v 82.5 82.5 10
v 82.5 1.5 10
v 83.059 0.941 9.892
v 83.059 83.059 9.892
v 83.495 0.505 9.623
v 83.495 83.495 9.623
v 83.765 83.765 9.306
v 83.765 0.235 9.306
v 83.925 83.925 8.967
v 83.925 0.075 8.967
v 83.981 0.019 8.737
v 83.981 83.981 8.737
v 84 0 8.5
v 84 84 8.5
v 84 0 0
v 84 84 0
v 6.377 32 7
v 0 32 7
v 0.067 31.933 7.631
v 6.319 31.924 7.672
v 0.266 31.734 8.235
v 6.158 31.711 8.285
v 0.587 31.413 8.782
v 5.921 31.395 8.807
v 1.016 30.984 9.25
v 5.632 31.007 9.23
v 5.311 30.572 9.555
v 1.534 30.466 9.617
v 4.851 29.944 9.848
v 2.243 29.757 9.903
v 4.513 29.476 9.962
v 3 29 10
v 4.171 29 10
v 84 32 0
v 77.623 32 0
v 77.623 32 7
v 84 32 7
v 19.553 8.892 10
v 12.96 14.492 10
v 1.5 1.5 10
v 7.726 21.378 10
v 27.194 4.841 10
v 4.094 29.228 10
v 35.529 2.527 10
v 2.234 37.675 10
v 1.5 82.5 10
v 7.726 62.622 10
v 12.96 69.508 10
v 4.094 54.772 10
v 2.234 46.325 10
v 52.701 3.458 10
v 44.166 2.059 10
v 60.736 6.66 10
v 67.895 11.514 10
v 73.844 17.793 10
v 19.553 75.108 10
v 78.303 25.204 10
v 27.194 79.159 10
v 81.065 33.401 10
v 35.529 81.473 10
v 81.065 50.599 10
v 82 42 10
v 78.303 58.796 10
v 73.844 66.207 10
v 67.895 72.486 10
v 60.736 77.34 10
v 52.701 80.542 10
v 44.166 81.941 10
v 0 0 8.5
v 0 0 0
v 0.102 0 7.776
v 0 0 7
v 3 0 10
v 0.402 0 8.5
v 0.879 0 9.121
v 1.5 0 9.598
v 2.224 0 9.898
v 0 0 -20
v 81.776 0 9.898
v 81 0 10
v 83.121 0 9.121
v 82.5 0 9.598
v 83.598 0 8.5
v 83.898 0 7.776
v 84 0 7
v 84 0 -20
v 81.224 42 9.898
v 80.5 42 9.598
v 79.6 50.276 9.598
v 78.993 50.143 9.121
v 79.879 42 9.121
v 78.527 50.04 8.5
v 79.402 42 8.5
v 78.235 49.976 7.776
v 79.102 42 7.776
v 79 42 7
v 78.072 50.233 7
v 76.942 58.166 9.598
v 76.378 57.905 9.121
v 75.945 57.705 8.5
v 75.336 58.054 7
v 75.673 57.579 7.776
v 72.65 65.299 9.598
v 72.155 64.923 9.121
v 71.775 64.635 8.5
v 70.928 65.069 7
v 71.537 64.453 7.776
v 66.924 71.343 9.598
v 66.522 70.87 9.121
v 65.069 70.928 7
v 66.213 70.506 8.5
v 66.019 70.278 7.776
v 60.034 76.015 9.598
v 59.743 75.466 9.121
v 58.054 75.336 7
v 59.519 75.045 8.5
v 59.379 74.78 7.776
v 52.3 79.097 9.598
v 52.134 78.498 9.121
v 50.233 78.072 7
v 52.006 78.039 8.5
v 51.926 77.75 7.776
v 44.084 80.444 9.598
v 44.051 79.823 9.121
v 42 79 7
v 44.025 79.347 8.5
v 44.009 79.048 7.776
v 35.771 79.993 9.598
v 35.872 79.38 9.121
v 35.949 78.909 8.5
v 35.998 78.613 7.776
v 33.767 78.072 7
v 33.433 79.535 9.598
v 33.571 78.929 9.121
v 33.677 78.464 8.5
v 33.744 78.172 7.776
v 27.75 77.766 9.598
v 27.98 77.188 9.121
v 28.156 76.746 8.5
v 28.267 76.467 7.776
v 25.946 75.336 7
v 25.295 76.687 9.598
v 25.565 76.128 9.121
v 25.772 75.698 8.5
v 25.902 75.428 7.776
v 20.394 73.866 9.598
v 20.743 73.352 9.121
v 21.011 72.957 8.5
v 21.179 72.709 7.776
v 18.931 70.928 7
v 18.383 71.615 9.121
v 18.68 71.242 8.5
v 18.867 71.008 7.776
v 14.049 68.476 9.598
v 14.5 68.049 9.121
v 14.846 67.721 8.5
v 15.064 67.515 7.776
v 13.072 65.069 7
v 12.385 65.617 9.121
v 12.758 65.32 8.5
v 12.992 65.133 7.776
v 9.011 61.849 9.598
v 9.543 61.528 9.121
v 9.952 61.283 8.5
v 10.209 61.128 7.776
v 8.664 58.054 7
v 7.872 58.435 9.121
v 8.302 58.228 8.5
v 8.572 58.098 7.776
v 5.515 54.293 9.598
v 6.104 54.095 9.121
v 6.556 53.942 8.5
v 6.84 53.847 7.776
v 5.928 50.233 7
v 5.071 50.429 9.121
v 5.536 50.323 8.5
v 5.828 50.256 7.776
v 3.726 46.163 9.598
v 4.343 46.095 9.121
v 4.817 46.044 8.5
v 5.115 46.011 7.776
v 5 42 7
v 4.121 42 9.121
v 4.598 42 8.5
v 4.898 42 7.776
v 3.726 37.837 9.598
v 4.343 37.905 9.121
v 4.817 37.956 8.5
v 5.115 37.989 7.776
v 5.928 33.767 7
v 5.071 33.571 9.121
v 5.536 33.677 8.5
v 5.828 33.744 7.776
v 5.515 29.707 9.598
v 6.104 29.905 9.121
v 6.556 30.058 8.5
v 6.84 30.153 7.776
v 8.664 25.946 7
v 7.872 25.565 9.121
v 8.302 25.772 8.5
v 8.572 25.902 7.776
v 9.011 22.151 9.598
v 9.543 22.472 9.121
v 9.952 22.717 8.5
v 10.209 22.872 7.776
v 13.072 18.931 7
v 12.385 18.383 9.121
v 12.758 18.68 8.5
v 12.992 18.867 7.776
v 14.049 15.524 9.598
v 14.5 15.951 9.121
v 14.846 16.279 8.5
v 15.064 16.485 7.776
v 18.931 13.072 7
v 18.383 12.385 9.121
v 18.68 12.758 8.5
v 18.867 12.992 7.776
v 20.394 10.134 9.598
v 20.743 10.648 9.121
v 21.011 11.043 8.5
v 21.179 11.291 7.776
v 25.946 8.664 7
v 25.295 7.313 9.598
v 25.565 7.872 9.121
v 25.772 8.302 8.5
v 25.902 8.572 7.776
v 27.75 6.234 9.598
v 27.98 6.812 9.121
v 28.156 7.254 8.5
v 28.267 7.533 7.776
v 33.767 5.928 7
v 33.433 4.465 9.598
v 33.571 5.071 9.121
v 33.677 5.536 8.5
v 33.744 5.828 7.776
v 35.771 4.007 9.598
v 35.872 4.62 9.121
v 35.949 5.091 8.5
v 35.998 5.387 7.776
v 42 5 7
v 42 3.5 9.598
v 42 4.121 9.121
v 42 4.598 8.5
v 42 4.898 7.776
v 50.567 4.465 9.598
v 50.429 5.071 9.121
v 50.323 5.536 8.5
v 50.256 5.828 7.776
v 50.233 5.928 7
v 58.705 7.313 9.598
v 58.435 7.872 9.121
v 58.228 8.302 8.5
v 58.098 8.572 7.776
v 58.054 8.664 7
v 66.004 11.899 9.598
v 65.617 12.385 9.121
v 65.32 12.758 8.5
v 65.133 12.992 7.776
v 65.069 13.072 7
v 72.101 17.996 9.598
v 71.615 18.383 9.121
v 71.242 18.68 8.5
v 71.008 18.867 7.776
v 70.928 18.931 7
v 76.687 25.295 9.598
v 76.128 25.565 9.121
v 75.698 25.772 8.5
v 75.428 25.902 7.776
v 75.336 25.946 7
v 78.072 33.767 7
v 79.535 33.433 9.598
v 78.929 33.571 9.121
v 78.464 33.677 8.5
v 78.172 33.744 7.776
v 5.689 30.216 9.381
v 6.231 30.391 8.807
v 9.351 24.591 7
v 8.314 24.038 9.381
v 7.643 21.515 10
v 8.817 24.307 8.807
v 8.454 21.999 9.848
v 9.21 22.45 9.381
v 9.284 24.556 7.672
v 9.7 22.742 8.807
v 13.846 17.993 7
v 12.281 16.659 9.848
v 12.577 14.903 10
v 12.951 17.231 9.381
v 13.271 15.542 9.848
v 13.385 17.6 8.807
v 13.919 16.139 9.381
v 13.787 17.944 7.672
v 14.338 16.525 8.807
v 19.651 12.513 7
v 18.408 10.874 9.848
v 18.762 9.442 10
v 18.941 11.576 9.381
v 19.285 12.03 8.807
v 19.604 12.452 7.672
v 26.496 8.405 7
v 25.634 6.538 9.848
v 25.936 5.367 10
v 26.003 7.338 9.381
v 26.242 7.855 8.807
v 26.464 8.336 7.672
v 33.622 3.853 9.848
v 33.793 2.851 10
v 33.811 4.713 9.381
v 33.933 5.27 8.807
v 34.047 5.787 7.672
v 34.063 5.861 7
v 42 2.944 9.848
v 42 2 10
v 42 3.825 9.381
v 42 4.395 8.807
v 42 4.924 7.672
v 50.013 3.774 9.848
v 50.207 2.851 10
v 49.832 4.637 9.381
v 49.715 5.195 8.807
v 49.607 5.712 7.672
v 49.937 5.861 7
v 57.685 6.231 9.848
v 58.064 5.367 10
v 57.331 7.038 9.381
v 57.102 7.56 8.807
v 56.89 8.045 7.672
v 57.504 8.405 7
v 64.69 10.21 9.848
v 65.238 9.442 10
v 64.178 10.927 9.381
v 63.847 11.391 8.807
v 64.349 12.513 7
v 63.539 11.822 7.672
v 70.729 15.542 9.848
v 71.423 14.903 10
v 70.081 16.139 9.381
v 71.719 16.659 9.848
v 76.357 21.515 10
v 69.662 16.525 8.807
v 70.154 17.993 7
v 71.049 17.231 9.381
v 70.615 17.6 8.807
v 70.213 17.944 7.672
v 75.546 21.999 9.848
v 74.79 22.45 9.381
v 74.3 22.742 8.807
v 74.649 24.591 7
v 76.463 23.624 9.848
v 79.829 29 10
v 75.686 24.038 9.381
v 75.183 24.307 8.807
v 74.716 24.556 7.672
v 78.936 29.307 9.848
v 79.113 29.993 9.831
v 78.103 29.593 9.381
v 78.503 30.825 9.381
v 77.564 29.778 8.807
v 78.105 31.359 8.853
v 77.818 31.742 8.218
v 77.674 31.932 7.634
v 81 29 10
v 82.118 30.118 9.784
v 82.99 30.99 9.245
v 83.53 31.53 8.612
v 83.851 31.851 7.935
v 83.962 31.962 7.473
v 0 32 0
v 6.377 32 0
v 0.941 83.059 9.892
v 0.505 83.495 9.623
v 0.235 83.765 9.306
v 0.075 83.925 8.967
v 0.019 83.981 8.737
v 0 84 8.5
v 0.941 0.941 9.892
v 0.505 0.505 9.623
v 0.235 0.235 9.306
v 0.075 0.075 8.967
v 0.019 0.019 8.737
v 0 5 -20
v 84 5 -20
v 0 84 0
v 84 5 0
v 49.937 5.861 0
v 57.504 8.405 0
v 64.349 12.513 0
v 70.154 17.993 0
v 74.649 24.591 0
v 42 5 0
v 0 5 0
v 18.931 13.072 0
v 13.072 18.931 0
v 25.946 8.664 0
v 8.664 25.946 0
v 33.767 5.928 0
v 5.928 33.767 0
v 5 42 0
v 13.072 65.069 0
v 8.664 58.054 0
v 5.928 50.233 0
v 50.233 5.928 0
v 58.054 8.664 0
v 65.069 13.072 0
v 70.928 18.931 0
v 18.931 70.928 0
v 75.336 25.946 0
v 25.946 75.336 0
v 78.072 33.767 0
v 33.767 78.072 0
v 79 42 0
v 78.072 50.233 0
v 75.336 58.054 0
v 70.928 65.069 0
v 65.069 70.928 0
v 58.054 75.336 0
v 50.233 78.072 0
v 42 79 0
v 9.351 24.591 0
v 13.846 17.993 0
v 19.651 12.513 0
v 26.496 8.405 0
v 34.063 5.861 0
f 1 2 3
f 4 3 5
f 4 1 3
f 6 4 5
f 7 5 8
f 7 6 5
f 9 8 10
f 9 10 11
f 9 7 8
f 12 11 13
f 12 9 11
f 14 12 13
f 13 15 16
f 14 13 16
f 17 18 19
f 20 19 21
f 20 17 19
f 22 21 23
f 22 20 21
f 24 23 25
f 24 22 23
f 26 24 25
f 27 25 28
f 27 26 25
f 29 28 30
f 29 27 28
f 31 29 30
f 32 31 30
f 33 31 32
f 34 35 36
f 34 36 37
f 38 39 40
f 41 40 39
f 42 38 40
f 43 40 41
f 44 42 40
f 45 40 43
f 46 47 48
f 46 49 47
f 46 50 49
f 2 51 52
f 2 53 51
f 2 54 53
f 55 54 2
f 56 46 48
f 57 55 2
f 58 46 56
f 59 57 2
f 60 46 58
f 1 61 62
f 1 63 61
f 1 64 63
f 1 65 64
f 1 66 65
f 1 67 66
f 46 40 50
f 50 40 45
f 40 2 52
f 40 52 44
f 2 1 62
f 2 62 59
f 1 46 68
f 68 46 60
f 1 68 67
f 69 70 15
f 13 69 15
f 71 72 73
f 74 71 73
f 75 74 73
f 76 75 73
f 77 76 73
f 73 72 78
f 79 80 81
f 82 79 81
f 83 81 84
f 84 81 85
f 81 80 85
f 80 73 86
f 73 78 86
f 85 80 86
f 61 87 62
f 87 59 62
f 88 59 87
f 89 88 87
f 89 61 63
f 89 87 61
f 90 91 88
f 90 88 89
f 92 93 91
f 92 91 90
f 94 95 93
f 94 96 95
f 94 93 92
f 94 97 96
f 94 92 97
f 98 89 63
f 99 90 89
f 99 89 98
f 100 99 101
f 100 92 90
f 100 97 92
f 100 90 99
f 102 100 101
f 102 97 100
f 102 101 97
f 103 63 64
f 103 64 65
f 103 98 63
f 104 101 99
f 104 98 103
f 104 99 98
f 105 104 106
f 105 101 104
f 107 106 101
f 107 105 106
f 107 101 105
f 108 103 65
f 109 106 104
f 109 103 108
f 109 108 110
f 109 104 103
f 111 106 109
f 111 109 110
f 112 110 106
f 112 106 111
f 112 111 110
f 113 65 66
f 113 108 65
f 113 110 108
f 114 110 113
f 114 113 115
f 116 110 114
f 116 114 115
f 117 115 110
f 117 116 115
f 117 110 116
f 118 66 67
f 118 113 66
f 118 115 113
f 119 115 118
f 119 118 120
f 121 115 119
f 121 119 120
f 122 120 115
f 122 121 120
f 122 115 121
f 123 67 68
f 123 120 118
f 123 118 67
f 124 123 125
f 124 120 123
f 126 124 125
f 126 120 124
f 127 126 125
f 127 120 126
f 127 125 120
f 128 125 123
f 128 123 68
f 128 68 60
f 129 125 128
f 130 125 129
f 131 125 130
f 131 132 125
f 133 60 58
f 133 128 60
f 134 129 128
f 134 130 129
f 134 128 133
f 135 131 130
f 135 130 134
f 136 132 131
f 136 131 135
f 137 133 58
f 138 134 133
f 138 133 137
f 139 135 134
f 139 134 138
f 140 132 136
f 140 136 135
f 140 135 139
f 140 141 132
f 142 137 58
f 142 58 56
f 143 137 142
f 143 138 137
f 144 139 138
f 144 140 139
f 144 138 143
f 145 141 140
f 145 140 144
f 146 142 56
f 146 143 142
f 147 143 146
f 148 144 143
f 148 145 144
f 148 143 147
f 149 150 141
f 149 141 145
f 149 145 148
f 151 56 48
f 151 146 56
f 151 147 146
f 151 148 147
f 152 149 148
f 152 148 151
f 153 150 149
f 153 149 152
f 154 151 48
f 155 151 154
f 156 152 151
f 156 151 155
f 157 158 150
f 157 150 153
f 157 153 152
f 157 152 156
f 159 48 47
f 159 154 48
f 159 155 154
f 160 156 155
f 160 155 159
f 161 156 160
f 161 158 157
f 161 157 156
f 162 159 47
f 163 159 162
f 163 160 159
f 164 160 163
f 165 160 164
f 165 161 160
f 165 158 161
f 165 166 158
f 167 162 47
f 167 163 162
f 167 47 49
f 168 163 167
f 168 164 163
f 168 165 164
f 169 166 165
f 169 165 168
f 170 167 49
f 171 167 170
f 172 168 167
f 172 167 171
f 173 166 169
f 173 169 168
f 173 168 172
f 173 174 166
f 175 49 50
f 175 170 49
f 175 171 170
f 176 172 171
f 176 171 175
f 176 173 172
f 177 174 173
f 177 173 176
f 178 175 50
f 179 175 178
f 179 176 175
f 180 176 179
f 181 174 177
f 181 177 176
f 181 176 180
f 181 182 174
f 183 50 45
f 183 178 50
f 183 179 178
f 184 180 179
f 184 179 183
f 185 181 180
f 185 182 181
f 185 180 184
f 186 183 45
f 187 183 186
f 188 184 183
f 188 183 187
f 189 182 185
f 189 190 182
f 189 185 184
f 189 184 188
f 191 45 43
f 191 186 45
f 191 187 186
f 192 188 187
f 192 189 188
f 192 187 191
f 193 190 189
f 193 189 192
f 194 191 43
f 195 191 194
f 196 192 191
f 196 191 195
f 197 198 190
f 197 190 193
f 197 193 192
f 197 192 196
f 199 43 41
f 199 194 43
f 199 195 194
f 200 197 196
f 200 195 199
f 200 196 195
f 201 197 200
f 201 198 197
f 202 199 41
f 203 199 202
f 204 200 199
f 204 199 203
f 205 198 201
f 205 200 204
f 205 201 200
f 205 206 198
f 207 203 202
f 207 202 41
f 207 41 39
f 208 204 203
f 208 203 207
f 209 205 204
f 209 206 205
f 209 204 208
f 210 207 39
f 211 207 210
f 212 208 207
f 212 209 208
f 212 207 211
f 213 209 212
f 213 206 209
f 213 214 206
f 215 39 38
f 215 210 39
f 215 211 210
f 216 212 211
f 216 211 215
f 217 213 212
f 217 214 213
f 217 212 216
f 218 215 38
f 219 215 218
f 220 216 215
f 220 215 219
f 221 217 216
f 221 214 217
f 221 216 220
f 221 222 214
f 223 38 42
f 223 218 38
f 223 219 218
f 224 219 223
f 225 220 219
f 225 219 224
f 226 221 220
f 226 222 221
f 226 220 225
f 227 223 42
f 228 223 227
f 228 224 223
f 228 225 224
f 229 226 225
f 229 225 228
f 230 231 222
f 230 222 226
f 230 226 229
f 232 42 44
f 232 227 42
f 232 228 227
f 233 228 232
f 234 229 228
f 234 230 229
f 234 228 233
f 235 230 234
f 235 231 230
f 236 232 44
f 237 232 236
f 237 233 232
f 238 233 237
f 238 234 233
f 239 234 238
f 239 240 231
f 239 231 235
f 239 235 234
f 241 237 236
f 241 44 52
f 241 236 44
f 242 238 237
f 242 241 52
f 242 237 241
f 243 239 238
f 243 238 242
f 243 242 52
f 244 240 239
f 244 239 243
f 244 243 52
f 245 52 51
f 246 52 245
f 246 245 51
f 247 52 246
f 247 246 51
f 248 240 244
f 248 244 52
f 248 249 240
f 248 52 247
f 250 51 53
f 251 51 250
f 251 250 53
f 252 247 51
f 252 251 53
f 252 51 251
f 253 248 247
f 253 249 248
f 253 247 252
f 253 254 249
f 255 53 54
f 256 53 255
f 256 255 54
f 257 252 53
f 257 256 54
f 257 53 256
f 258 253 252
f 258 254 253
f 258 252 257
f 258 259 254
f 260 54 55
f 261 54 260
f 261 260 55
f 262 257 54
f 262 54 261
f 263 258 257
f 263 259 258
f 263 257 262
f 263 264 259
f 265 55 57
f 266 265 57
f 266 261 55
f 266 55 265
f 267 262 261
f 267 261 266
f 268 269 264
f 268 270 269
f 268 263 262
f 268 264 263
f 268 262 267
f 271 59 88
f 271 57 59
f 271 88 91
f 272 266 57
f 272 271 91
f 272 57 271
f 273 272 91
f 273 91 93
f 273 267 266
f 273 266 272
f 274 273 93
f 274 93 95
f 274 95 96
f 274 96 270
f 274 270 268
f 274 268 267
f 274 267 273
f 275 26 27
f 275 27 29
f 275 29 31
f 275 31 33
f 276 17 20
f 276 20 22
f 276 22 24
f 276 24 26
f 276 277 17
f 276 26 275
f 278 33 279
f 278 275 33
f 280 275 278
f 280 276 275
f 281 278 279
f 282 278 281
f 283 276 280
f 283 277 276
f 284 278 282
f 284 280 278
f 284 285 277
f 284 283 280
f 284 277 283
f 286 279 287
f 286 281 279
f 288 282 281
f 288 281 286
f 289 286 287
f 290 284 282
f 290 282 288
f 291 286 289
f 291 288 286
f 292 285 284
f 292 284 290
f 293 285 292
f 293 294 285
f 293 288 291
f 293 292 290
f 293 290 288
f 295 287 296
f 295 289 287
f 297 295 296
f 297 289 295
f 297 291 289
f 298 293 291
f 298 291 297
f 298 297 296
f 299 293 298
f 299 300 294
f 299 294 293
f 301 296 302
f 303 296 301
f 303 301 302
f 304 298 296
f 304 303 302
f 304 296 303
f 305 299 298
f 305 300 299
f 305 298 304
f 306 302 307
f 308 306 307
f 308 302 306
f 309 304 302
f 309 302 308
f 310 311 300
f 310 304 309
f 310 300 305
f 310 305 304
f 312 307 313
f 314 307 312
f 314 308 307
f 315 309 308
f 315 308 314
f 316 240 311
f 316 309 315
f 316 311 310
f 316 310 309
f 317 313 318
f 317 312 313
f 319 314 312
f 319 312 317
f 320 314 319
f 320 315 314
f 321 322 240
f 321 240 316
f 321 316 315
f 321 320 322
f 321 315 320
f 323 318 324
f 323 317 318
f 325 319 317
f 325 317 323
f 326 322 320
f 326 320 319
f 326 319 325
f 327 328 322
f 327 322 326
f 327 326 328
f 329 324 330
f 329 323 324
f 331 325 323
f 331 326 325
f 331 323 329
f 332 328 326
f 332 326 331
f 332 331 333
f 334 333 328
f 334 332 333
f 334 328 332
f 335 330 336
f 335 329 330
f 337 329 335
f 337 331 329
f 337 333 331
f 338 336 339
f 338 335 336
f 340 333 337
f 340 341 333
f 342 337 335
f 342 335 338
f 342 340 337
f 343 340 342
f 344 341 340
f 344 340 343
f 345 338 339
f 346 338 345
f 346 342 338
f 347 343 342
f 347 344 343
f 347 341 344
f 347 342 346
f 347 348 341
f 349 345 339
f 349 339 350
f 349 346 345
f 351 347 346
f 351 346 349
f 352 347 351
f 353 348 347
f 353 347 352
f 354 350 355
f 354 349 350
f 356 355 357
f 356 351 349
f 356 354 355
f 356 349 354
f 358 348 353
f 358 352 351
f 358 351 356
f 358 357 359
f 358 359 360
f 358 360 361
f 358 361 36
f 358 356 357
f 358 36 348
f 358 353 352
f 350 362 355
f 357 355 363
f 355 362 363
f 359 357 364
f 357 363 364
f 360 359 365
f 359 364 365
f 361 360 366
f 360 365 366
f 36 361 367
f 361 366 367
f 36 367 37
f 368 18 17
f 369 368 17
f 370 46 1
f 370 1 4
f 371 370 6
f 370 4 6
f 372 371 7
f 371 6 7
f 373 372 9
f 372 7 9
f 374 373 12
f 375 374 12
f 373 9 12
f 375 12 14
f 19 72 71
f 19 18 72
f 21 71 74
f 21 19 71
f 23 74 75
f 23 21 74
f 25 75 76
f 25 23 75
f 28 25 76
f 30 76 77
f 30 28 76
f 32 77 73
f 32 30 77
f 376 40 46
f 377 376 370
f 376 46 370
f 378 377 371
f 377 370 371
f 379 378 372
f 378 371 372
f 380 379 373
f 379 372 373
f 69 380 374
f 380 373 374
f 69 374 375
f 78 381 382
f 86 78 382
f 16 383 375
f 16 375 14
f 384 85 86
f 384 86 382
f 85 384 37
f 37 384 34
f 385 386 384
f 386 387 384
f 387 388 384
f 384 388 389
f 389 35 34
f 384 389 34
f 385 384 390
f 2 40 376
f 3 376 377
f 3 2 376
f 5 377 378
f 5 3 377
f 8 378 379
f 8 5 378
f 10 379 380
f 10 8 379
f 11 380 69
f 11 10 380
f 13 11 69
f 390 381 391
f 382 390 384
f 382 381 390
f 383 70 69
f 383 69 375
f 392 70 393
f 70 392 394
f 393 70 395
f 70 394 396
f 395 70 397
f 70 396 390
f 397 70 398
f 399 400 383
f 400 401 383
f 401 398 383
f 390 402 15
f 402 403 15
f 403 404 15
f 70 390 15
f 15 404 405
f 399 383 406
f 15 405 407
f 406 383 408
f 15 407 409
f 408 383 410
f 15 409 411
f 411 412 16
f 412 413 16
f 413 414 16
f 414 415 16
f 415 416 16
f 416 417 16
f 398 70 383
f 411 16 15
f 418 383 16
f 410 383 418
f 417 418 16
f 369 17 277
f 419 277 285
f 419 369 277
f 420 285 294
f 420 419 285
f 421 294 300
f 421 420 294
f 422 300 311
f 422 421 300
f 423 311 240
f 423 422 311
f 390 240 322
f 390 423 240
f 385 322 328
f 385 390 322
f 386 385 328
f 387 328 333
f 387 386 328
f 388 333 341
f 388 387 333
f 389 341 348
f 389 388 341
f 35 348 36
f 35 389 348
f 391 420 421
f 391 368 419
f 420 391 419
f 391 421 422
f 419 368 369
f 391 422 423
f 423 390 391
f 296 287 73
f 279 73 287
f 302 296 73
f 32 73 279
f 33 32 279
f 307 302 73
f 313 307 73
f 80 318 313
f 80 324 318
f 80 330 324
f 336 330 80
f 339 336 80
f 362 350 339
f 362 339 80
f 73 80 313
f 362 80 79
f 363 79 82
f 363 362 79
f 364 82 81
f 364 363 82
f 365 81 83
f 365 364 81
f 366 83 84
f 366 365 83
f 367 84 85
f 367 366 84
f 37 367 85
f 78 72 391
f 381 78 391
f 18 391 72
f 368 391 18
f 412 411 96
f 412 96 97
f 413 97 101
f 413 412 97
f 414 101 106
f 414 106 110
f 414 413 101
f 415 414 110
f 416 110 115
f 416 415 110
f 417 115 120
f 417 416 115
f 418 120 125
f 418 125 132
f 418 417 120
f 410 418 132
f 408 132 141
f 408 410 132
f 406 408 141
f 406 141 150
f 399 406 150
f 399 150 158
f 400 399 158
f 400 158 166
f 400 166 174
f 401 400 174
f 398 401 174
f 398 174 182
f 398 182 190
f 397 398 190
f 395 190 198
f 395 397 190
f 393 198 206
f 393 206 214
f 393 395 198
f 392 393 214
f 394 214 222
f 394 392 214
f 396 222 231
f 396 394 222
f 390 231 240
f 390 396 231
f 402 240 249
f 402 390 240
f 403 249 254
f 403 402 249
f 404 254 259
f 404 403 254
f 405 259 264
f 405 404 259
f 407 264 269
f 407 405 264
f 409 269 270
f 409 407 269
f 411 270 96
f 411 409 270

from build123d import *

# Parameters (mm, degrees)
CYLINDER_R        = 37
CYLINDER_DEPTH    = 10
BOX_W             = 84
BOX_H             = 84
BOX_DEPTH         = 10
FILLET_R          = 3
FILLET001_R       = 1.5
BOX003_W          = 84
BOX003_H          = 100
BOX003_DEPTH      = 10
CYLINDER001_R     = 37
CYLINDER001_DEPTH = 10
BOX001_W          = 84
BOX001_H          = 84
BOX001_DEPTH      = 10
FILLET002_R       = 3
BOX002_W          = 84
BOX002_H          = 5
BOX002_DEPTH      = 20


with BuildPart() as cylinder:
    # Cylinder → Cylinder (new body)
    with BuildSketch(Plane(origin=(42, 42, 0), x_dir=(1, 0, 0), z_dir=(0, 0, 1))):
        Circle(CYLINDER_R)
    extrude(amount=CYLINDER_DEPTH)


with BuildPart() as bar_rack_bottle_holder:
    # Box → Box (new body)
    with BuildSketch(Plane.XY):
        with Locations((42, 42)):
            Rectangle(BOX_W, BOX_H)
    extrude(amount=BOX_DEPTH)

    # Cut: cut Cylinder
    add(cylinder.part, mode=Mode.SUBTRACT)

    # Fillet
    fillet_edges = [bar_rack_bottle_holder.edges().sort_by_distance(p)[0] for p in [
        (5, 42, 10),
    ]]
    fillet(fillet_edges, radius=FILLET_R)

    # Fillet001
    fillet001_edges = [bar_rack_bottle_holder.edges().sort_by_distance(p)[0] for p in [
        (0, 42, 10),
        (42, 0, 10),
        (84, 42, 10),
        (42, 84, 10),
    ]]
    fillet(fillet001_edges, radius=FILLET001_R)


with BuildPart() as cube003:
    # Box003 → Box003 (new body)
    with BuildSketch(Plane(origin=(0, 32, 0), x_dir=(1, 0, 0), z_dir=(0, 0, 1))):
        with Locations((42, 50)):
            Rectangle(BOX003_W, BOX003_H)
    extrude(amount=BOX003_DEPTH)


with BuildPart() as cylinder001:
    # Cylinder001 → Cylinder001 (new body)
    with BuildSketch(Plane(origin=(42, 42, 0), x_dir=(1, 0, 0), z_dir=(0, 0, 1))):
        Circle(CYLINDER001_R)
    extrude(amount=CYLINDER001_DEPTH)


with BuildPart() as fillet002:
    # Box001 → Box001 (new body)
    with BuildSketch(Plane.XY):
        with Locations((42, 42)):
            Rectangle(BOX001_W, BOX001_H)
    extrude(amount=BOX001_DEPTH)

    # Cut001: cut Cylinder001
    add(cylinder001.part, mode=Mode.SUBTRACT)

    # Cut002: cut Cube003
    add(cube003.part, mode=Mode.SUBTRACT)

    # Fillet002
    fillet002_edges = [fillet002.edges().sort_by_distance(p)[0] for p in [
        (0, 16, 10),
        (3.188487, 32, 10),
        (42, 5, 10),
        (80.811513, 32, 10),
        (84, 16, 10),
    ]]
    fillet(fillet002_edges, radius=FILLET002_R)


with BuildPart() as bar_rack_bottle_holder_partial:
    # Box002 → Box002 (new body)
    with BuildSketch(Plane.XY.offset(-20)):
        with Locations((42, 2.5)):
            Rectangle(BOX002_W, BOX002_H)
    extrude(amount=BOX002_DEPTH)

    # Fusion: union Fillet002
    add(fillet002.part)


solid = Compound([bar_rack_bottle_holder.part, bar_rack_bottle_holder_partial.part])
